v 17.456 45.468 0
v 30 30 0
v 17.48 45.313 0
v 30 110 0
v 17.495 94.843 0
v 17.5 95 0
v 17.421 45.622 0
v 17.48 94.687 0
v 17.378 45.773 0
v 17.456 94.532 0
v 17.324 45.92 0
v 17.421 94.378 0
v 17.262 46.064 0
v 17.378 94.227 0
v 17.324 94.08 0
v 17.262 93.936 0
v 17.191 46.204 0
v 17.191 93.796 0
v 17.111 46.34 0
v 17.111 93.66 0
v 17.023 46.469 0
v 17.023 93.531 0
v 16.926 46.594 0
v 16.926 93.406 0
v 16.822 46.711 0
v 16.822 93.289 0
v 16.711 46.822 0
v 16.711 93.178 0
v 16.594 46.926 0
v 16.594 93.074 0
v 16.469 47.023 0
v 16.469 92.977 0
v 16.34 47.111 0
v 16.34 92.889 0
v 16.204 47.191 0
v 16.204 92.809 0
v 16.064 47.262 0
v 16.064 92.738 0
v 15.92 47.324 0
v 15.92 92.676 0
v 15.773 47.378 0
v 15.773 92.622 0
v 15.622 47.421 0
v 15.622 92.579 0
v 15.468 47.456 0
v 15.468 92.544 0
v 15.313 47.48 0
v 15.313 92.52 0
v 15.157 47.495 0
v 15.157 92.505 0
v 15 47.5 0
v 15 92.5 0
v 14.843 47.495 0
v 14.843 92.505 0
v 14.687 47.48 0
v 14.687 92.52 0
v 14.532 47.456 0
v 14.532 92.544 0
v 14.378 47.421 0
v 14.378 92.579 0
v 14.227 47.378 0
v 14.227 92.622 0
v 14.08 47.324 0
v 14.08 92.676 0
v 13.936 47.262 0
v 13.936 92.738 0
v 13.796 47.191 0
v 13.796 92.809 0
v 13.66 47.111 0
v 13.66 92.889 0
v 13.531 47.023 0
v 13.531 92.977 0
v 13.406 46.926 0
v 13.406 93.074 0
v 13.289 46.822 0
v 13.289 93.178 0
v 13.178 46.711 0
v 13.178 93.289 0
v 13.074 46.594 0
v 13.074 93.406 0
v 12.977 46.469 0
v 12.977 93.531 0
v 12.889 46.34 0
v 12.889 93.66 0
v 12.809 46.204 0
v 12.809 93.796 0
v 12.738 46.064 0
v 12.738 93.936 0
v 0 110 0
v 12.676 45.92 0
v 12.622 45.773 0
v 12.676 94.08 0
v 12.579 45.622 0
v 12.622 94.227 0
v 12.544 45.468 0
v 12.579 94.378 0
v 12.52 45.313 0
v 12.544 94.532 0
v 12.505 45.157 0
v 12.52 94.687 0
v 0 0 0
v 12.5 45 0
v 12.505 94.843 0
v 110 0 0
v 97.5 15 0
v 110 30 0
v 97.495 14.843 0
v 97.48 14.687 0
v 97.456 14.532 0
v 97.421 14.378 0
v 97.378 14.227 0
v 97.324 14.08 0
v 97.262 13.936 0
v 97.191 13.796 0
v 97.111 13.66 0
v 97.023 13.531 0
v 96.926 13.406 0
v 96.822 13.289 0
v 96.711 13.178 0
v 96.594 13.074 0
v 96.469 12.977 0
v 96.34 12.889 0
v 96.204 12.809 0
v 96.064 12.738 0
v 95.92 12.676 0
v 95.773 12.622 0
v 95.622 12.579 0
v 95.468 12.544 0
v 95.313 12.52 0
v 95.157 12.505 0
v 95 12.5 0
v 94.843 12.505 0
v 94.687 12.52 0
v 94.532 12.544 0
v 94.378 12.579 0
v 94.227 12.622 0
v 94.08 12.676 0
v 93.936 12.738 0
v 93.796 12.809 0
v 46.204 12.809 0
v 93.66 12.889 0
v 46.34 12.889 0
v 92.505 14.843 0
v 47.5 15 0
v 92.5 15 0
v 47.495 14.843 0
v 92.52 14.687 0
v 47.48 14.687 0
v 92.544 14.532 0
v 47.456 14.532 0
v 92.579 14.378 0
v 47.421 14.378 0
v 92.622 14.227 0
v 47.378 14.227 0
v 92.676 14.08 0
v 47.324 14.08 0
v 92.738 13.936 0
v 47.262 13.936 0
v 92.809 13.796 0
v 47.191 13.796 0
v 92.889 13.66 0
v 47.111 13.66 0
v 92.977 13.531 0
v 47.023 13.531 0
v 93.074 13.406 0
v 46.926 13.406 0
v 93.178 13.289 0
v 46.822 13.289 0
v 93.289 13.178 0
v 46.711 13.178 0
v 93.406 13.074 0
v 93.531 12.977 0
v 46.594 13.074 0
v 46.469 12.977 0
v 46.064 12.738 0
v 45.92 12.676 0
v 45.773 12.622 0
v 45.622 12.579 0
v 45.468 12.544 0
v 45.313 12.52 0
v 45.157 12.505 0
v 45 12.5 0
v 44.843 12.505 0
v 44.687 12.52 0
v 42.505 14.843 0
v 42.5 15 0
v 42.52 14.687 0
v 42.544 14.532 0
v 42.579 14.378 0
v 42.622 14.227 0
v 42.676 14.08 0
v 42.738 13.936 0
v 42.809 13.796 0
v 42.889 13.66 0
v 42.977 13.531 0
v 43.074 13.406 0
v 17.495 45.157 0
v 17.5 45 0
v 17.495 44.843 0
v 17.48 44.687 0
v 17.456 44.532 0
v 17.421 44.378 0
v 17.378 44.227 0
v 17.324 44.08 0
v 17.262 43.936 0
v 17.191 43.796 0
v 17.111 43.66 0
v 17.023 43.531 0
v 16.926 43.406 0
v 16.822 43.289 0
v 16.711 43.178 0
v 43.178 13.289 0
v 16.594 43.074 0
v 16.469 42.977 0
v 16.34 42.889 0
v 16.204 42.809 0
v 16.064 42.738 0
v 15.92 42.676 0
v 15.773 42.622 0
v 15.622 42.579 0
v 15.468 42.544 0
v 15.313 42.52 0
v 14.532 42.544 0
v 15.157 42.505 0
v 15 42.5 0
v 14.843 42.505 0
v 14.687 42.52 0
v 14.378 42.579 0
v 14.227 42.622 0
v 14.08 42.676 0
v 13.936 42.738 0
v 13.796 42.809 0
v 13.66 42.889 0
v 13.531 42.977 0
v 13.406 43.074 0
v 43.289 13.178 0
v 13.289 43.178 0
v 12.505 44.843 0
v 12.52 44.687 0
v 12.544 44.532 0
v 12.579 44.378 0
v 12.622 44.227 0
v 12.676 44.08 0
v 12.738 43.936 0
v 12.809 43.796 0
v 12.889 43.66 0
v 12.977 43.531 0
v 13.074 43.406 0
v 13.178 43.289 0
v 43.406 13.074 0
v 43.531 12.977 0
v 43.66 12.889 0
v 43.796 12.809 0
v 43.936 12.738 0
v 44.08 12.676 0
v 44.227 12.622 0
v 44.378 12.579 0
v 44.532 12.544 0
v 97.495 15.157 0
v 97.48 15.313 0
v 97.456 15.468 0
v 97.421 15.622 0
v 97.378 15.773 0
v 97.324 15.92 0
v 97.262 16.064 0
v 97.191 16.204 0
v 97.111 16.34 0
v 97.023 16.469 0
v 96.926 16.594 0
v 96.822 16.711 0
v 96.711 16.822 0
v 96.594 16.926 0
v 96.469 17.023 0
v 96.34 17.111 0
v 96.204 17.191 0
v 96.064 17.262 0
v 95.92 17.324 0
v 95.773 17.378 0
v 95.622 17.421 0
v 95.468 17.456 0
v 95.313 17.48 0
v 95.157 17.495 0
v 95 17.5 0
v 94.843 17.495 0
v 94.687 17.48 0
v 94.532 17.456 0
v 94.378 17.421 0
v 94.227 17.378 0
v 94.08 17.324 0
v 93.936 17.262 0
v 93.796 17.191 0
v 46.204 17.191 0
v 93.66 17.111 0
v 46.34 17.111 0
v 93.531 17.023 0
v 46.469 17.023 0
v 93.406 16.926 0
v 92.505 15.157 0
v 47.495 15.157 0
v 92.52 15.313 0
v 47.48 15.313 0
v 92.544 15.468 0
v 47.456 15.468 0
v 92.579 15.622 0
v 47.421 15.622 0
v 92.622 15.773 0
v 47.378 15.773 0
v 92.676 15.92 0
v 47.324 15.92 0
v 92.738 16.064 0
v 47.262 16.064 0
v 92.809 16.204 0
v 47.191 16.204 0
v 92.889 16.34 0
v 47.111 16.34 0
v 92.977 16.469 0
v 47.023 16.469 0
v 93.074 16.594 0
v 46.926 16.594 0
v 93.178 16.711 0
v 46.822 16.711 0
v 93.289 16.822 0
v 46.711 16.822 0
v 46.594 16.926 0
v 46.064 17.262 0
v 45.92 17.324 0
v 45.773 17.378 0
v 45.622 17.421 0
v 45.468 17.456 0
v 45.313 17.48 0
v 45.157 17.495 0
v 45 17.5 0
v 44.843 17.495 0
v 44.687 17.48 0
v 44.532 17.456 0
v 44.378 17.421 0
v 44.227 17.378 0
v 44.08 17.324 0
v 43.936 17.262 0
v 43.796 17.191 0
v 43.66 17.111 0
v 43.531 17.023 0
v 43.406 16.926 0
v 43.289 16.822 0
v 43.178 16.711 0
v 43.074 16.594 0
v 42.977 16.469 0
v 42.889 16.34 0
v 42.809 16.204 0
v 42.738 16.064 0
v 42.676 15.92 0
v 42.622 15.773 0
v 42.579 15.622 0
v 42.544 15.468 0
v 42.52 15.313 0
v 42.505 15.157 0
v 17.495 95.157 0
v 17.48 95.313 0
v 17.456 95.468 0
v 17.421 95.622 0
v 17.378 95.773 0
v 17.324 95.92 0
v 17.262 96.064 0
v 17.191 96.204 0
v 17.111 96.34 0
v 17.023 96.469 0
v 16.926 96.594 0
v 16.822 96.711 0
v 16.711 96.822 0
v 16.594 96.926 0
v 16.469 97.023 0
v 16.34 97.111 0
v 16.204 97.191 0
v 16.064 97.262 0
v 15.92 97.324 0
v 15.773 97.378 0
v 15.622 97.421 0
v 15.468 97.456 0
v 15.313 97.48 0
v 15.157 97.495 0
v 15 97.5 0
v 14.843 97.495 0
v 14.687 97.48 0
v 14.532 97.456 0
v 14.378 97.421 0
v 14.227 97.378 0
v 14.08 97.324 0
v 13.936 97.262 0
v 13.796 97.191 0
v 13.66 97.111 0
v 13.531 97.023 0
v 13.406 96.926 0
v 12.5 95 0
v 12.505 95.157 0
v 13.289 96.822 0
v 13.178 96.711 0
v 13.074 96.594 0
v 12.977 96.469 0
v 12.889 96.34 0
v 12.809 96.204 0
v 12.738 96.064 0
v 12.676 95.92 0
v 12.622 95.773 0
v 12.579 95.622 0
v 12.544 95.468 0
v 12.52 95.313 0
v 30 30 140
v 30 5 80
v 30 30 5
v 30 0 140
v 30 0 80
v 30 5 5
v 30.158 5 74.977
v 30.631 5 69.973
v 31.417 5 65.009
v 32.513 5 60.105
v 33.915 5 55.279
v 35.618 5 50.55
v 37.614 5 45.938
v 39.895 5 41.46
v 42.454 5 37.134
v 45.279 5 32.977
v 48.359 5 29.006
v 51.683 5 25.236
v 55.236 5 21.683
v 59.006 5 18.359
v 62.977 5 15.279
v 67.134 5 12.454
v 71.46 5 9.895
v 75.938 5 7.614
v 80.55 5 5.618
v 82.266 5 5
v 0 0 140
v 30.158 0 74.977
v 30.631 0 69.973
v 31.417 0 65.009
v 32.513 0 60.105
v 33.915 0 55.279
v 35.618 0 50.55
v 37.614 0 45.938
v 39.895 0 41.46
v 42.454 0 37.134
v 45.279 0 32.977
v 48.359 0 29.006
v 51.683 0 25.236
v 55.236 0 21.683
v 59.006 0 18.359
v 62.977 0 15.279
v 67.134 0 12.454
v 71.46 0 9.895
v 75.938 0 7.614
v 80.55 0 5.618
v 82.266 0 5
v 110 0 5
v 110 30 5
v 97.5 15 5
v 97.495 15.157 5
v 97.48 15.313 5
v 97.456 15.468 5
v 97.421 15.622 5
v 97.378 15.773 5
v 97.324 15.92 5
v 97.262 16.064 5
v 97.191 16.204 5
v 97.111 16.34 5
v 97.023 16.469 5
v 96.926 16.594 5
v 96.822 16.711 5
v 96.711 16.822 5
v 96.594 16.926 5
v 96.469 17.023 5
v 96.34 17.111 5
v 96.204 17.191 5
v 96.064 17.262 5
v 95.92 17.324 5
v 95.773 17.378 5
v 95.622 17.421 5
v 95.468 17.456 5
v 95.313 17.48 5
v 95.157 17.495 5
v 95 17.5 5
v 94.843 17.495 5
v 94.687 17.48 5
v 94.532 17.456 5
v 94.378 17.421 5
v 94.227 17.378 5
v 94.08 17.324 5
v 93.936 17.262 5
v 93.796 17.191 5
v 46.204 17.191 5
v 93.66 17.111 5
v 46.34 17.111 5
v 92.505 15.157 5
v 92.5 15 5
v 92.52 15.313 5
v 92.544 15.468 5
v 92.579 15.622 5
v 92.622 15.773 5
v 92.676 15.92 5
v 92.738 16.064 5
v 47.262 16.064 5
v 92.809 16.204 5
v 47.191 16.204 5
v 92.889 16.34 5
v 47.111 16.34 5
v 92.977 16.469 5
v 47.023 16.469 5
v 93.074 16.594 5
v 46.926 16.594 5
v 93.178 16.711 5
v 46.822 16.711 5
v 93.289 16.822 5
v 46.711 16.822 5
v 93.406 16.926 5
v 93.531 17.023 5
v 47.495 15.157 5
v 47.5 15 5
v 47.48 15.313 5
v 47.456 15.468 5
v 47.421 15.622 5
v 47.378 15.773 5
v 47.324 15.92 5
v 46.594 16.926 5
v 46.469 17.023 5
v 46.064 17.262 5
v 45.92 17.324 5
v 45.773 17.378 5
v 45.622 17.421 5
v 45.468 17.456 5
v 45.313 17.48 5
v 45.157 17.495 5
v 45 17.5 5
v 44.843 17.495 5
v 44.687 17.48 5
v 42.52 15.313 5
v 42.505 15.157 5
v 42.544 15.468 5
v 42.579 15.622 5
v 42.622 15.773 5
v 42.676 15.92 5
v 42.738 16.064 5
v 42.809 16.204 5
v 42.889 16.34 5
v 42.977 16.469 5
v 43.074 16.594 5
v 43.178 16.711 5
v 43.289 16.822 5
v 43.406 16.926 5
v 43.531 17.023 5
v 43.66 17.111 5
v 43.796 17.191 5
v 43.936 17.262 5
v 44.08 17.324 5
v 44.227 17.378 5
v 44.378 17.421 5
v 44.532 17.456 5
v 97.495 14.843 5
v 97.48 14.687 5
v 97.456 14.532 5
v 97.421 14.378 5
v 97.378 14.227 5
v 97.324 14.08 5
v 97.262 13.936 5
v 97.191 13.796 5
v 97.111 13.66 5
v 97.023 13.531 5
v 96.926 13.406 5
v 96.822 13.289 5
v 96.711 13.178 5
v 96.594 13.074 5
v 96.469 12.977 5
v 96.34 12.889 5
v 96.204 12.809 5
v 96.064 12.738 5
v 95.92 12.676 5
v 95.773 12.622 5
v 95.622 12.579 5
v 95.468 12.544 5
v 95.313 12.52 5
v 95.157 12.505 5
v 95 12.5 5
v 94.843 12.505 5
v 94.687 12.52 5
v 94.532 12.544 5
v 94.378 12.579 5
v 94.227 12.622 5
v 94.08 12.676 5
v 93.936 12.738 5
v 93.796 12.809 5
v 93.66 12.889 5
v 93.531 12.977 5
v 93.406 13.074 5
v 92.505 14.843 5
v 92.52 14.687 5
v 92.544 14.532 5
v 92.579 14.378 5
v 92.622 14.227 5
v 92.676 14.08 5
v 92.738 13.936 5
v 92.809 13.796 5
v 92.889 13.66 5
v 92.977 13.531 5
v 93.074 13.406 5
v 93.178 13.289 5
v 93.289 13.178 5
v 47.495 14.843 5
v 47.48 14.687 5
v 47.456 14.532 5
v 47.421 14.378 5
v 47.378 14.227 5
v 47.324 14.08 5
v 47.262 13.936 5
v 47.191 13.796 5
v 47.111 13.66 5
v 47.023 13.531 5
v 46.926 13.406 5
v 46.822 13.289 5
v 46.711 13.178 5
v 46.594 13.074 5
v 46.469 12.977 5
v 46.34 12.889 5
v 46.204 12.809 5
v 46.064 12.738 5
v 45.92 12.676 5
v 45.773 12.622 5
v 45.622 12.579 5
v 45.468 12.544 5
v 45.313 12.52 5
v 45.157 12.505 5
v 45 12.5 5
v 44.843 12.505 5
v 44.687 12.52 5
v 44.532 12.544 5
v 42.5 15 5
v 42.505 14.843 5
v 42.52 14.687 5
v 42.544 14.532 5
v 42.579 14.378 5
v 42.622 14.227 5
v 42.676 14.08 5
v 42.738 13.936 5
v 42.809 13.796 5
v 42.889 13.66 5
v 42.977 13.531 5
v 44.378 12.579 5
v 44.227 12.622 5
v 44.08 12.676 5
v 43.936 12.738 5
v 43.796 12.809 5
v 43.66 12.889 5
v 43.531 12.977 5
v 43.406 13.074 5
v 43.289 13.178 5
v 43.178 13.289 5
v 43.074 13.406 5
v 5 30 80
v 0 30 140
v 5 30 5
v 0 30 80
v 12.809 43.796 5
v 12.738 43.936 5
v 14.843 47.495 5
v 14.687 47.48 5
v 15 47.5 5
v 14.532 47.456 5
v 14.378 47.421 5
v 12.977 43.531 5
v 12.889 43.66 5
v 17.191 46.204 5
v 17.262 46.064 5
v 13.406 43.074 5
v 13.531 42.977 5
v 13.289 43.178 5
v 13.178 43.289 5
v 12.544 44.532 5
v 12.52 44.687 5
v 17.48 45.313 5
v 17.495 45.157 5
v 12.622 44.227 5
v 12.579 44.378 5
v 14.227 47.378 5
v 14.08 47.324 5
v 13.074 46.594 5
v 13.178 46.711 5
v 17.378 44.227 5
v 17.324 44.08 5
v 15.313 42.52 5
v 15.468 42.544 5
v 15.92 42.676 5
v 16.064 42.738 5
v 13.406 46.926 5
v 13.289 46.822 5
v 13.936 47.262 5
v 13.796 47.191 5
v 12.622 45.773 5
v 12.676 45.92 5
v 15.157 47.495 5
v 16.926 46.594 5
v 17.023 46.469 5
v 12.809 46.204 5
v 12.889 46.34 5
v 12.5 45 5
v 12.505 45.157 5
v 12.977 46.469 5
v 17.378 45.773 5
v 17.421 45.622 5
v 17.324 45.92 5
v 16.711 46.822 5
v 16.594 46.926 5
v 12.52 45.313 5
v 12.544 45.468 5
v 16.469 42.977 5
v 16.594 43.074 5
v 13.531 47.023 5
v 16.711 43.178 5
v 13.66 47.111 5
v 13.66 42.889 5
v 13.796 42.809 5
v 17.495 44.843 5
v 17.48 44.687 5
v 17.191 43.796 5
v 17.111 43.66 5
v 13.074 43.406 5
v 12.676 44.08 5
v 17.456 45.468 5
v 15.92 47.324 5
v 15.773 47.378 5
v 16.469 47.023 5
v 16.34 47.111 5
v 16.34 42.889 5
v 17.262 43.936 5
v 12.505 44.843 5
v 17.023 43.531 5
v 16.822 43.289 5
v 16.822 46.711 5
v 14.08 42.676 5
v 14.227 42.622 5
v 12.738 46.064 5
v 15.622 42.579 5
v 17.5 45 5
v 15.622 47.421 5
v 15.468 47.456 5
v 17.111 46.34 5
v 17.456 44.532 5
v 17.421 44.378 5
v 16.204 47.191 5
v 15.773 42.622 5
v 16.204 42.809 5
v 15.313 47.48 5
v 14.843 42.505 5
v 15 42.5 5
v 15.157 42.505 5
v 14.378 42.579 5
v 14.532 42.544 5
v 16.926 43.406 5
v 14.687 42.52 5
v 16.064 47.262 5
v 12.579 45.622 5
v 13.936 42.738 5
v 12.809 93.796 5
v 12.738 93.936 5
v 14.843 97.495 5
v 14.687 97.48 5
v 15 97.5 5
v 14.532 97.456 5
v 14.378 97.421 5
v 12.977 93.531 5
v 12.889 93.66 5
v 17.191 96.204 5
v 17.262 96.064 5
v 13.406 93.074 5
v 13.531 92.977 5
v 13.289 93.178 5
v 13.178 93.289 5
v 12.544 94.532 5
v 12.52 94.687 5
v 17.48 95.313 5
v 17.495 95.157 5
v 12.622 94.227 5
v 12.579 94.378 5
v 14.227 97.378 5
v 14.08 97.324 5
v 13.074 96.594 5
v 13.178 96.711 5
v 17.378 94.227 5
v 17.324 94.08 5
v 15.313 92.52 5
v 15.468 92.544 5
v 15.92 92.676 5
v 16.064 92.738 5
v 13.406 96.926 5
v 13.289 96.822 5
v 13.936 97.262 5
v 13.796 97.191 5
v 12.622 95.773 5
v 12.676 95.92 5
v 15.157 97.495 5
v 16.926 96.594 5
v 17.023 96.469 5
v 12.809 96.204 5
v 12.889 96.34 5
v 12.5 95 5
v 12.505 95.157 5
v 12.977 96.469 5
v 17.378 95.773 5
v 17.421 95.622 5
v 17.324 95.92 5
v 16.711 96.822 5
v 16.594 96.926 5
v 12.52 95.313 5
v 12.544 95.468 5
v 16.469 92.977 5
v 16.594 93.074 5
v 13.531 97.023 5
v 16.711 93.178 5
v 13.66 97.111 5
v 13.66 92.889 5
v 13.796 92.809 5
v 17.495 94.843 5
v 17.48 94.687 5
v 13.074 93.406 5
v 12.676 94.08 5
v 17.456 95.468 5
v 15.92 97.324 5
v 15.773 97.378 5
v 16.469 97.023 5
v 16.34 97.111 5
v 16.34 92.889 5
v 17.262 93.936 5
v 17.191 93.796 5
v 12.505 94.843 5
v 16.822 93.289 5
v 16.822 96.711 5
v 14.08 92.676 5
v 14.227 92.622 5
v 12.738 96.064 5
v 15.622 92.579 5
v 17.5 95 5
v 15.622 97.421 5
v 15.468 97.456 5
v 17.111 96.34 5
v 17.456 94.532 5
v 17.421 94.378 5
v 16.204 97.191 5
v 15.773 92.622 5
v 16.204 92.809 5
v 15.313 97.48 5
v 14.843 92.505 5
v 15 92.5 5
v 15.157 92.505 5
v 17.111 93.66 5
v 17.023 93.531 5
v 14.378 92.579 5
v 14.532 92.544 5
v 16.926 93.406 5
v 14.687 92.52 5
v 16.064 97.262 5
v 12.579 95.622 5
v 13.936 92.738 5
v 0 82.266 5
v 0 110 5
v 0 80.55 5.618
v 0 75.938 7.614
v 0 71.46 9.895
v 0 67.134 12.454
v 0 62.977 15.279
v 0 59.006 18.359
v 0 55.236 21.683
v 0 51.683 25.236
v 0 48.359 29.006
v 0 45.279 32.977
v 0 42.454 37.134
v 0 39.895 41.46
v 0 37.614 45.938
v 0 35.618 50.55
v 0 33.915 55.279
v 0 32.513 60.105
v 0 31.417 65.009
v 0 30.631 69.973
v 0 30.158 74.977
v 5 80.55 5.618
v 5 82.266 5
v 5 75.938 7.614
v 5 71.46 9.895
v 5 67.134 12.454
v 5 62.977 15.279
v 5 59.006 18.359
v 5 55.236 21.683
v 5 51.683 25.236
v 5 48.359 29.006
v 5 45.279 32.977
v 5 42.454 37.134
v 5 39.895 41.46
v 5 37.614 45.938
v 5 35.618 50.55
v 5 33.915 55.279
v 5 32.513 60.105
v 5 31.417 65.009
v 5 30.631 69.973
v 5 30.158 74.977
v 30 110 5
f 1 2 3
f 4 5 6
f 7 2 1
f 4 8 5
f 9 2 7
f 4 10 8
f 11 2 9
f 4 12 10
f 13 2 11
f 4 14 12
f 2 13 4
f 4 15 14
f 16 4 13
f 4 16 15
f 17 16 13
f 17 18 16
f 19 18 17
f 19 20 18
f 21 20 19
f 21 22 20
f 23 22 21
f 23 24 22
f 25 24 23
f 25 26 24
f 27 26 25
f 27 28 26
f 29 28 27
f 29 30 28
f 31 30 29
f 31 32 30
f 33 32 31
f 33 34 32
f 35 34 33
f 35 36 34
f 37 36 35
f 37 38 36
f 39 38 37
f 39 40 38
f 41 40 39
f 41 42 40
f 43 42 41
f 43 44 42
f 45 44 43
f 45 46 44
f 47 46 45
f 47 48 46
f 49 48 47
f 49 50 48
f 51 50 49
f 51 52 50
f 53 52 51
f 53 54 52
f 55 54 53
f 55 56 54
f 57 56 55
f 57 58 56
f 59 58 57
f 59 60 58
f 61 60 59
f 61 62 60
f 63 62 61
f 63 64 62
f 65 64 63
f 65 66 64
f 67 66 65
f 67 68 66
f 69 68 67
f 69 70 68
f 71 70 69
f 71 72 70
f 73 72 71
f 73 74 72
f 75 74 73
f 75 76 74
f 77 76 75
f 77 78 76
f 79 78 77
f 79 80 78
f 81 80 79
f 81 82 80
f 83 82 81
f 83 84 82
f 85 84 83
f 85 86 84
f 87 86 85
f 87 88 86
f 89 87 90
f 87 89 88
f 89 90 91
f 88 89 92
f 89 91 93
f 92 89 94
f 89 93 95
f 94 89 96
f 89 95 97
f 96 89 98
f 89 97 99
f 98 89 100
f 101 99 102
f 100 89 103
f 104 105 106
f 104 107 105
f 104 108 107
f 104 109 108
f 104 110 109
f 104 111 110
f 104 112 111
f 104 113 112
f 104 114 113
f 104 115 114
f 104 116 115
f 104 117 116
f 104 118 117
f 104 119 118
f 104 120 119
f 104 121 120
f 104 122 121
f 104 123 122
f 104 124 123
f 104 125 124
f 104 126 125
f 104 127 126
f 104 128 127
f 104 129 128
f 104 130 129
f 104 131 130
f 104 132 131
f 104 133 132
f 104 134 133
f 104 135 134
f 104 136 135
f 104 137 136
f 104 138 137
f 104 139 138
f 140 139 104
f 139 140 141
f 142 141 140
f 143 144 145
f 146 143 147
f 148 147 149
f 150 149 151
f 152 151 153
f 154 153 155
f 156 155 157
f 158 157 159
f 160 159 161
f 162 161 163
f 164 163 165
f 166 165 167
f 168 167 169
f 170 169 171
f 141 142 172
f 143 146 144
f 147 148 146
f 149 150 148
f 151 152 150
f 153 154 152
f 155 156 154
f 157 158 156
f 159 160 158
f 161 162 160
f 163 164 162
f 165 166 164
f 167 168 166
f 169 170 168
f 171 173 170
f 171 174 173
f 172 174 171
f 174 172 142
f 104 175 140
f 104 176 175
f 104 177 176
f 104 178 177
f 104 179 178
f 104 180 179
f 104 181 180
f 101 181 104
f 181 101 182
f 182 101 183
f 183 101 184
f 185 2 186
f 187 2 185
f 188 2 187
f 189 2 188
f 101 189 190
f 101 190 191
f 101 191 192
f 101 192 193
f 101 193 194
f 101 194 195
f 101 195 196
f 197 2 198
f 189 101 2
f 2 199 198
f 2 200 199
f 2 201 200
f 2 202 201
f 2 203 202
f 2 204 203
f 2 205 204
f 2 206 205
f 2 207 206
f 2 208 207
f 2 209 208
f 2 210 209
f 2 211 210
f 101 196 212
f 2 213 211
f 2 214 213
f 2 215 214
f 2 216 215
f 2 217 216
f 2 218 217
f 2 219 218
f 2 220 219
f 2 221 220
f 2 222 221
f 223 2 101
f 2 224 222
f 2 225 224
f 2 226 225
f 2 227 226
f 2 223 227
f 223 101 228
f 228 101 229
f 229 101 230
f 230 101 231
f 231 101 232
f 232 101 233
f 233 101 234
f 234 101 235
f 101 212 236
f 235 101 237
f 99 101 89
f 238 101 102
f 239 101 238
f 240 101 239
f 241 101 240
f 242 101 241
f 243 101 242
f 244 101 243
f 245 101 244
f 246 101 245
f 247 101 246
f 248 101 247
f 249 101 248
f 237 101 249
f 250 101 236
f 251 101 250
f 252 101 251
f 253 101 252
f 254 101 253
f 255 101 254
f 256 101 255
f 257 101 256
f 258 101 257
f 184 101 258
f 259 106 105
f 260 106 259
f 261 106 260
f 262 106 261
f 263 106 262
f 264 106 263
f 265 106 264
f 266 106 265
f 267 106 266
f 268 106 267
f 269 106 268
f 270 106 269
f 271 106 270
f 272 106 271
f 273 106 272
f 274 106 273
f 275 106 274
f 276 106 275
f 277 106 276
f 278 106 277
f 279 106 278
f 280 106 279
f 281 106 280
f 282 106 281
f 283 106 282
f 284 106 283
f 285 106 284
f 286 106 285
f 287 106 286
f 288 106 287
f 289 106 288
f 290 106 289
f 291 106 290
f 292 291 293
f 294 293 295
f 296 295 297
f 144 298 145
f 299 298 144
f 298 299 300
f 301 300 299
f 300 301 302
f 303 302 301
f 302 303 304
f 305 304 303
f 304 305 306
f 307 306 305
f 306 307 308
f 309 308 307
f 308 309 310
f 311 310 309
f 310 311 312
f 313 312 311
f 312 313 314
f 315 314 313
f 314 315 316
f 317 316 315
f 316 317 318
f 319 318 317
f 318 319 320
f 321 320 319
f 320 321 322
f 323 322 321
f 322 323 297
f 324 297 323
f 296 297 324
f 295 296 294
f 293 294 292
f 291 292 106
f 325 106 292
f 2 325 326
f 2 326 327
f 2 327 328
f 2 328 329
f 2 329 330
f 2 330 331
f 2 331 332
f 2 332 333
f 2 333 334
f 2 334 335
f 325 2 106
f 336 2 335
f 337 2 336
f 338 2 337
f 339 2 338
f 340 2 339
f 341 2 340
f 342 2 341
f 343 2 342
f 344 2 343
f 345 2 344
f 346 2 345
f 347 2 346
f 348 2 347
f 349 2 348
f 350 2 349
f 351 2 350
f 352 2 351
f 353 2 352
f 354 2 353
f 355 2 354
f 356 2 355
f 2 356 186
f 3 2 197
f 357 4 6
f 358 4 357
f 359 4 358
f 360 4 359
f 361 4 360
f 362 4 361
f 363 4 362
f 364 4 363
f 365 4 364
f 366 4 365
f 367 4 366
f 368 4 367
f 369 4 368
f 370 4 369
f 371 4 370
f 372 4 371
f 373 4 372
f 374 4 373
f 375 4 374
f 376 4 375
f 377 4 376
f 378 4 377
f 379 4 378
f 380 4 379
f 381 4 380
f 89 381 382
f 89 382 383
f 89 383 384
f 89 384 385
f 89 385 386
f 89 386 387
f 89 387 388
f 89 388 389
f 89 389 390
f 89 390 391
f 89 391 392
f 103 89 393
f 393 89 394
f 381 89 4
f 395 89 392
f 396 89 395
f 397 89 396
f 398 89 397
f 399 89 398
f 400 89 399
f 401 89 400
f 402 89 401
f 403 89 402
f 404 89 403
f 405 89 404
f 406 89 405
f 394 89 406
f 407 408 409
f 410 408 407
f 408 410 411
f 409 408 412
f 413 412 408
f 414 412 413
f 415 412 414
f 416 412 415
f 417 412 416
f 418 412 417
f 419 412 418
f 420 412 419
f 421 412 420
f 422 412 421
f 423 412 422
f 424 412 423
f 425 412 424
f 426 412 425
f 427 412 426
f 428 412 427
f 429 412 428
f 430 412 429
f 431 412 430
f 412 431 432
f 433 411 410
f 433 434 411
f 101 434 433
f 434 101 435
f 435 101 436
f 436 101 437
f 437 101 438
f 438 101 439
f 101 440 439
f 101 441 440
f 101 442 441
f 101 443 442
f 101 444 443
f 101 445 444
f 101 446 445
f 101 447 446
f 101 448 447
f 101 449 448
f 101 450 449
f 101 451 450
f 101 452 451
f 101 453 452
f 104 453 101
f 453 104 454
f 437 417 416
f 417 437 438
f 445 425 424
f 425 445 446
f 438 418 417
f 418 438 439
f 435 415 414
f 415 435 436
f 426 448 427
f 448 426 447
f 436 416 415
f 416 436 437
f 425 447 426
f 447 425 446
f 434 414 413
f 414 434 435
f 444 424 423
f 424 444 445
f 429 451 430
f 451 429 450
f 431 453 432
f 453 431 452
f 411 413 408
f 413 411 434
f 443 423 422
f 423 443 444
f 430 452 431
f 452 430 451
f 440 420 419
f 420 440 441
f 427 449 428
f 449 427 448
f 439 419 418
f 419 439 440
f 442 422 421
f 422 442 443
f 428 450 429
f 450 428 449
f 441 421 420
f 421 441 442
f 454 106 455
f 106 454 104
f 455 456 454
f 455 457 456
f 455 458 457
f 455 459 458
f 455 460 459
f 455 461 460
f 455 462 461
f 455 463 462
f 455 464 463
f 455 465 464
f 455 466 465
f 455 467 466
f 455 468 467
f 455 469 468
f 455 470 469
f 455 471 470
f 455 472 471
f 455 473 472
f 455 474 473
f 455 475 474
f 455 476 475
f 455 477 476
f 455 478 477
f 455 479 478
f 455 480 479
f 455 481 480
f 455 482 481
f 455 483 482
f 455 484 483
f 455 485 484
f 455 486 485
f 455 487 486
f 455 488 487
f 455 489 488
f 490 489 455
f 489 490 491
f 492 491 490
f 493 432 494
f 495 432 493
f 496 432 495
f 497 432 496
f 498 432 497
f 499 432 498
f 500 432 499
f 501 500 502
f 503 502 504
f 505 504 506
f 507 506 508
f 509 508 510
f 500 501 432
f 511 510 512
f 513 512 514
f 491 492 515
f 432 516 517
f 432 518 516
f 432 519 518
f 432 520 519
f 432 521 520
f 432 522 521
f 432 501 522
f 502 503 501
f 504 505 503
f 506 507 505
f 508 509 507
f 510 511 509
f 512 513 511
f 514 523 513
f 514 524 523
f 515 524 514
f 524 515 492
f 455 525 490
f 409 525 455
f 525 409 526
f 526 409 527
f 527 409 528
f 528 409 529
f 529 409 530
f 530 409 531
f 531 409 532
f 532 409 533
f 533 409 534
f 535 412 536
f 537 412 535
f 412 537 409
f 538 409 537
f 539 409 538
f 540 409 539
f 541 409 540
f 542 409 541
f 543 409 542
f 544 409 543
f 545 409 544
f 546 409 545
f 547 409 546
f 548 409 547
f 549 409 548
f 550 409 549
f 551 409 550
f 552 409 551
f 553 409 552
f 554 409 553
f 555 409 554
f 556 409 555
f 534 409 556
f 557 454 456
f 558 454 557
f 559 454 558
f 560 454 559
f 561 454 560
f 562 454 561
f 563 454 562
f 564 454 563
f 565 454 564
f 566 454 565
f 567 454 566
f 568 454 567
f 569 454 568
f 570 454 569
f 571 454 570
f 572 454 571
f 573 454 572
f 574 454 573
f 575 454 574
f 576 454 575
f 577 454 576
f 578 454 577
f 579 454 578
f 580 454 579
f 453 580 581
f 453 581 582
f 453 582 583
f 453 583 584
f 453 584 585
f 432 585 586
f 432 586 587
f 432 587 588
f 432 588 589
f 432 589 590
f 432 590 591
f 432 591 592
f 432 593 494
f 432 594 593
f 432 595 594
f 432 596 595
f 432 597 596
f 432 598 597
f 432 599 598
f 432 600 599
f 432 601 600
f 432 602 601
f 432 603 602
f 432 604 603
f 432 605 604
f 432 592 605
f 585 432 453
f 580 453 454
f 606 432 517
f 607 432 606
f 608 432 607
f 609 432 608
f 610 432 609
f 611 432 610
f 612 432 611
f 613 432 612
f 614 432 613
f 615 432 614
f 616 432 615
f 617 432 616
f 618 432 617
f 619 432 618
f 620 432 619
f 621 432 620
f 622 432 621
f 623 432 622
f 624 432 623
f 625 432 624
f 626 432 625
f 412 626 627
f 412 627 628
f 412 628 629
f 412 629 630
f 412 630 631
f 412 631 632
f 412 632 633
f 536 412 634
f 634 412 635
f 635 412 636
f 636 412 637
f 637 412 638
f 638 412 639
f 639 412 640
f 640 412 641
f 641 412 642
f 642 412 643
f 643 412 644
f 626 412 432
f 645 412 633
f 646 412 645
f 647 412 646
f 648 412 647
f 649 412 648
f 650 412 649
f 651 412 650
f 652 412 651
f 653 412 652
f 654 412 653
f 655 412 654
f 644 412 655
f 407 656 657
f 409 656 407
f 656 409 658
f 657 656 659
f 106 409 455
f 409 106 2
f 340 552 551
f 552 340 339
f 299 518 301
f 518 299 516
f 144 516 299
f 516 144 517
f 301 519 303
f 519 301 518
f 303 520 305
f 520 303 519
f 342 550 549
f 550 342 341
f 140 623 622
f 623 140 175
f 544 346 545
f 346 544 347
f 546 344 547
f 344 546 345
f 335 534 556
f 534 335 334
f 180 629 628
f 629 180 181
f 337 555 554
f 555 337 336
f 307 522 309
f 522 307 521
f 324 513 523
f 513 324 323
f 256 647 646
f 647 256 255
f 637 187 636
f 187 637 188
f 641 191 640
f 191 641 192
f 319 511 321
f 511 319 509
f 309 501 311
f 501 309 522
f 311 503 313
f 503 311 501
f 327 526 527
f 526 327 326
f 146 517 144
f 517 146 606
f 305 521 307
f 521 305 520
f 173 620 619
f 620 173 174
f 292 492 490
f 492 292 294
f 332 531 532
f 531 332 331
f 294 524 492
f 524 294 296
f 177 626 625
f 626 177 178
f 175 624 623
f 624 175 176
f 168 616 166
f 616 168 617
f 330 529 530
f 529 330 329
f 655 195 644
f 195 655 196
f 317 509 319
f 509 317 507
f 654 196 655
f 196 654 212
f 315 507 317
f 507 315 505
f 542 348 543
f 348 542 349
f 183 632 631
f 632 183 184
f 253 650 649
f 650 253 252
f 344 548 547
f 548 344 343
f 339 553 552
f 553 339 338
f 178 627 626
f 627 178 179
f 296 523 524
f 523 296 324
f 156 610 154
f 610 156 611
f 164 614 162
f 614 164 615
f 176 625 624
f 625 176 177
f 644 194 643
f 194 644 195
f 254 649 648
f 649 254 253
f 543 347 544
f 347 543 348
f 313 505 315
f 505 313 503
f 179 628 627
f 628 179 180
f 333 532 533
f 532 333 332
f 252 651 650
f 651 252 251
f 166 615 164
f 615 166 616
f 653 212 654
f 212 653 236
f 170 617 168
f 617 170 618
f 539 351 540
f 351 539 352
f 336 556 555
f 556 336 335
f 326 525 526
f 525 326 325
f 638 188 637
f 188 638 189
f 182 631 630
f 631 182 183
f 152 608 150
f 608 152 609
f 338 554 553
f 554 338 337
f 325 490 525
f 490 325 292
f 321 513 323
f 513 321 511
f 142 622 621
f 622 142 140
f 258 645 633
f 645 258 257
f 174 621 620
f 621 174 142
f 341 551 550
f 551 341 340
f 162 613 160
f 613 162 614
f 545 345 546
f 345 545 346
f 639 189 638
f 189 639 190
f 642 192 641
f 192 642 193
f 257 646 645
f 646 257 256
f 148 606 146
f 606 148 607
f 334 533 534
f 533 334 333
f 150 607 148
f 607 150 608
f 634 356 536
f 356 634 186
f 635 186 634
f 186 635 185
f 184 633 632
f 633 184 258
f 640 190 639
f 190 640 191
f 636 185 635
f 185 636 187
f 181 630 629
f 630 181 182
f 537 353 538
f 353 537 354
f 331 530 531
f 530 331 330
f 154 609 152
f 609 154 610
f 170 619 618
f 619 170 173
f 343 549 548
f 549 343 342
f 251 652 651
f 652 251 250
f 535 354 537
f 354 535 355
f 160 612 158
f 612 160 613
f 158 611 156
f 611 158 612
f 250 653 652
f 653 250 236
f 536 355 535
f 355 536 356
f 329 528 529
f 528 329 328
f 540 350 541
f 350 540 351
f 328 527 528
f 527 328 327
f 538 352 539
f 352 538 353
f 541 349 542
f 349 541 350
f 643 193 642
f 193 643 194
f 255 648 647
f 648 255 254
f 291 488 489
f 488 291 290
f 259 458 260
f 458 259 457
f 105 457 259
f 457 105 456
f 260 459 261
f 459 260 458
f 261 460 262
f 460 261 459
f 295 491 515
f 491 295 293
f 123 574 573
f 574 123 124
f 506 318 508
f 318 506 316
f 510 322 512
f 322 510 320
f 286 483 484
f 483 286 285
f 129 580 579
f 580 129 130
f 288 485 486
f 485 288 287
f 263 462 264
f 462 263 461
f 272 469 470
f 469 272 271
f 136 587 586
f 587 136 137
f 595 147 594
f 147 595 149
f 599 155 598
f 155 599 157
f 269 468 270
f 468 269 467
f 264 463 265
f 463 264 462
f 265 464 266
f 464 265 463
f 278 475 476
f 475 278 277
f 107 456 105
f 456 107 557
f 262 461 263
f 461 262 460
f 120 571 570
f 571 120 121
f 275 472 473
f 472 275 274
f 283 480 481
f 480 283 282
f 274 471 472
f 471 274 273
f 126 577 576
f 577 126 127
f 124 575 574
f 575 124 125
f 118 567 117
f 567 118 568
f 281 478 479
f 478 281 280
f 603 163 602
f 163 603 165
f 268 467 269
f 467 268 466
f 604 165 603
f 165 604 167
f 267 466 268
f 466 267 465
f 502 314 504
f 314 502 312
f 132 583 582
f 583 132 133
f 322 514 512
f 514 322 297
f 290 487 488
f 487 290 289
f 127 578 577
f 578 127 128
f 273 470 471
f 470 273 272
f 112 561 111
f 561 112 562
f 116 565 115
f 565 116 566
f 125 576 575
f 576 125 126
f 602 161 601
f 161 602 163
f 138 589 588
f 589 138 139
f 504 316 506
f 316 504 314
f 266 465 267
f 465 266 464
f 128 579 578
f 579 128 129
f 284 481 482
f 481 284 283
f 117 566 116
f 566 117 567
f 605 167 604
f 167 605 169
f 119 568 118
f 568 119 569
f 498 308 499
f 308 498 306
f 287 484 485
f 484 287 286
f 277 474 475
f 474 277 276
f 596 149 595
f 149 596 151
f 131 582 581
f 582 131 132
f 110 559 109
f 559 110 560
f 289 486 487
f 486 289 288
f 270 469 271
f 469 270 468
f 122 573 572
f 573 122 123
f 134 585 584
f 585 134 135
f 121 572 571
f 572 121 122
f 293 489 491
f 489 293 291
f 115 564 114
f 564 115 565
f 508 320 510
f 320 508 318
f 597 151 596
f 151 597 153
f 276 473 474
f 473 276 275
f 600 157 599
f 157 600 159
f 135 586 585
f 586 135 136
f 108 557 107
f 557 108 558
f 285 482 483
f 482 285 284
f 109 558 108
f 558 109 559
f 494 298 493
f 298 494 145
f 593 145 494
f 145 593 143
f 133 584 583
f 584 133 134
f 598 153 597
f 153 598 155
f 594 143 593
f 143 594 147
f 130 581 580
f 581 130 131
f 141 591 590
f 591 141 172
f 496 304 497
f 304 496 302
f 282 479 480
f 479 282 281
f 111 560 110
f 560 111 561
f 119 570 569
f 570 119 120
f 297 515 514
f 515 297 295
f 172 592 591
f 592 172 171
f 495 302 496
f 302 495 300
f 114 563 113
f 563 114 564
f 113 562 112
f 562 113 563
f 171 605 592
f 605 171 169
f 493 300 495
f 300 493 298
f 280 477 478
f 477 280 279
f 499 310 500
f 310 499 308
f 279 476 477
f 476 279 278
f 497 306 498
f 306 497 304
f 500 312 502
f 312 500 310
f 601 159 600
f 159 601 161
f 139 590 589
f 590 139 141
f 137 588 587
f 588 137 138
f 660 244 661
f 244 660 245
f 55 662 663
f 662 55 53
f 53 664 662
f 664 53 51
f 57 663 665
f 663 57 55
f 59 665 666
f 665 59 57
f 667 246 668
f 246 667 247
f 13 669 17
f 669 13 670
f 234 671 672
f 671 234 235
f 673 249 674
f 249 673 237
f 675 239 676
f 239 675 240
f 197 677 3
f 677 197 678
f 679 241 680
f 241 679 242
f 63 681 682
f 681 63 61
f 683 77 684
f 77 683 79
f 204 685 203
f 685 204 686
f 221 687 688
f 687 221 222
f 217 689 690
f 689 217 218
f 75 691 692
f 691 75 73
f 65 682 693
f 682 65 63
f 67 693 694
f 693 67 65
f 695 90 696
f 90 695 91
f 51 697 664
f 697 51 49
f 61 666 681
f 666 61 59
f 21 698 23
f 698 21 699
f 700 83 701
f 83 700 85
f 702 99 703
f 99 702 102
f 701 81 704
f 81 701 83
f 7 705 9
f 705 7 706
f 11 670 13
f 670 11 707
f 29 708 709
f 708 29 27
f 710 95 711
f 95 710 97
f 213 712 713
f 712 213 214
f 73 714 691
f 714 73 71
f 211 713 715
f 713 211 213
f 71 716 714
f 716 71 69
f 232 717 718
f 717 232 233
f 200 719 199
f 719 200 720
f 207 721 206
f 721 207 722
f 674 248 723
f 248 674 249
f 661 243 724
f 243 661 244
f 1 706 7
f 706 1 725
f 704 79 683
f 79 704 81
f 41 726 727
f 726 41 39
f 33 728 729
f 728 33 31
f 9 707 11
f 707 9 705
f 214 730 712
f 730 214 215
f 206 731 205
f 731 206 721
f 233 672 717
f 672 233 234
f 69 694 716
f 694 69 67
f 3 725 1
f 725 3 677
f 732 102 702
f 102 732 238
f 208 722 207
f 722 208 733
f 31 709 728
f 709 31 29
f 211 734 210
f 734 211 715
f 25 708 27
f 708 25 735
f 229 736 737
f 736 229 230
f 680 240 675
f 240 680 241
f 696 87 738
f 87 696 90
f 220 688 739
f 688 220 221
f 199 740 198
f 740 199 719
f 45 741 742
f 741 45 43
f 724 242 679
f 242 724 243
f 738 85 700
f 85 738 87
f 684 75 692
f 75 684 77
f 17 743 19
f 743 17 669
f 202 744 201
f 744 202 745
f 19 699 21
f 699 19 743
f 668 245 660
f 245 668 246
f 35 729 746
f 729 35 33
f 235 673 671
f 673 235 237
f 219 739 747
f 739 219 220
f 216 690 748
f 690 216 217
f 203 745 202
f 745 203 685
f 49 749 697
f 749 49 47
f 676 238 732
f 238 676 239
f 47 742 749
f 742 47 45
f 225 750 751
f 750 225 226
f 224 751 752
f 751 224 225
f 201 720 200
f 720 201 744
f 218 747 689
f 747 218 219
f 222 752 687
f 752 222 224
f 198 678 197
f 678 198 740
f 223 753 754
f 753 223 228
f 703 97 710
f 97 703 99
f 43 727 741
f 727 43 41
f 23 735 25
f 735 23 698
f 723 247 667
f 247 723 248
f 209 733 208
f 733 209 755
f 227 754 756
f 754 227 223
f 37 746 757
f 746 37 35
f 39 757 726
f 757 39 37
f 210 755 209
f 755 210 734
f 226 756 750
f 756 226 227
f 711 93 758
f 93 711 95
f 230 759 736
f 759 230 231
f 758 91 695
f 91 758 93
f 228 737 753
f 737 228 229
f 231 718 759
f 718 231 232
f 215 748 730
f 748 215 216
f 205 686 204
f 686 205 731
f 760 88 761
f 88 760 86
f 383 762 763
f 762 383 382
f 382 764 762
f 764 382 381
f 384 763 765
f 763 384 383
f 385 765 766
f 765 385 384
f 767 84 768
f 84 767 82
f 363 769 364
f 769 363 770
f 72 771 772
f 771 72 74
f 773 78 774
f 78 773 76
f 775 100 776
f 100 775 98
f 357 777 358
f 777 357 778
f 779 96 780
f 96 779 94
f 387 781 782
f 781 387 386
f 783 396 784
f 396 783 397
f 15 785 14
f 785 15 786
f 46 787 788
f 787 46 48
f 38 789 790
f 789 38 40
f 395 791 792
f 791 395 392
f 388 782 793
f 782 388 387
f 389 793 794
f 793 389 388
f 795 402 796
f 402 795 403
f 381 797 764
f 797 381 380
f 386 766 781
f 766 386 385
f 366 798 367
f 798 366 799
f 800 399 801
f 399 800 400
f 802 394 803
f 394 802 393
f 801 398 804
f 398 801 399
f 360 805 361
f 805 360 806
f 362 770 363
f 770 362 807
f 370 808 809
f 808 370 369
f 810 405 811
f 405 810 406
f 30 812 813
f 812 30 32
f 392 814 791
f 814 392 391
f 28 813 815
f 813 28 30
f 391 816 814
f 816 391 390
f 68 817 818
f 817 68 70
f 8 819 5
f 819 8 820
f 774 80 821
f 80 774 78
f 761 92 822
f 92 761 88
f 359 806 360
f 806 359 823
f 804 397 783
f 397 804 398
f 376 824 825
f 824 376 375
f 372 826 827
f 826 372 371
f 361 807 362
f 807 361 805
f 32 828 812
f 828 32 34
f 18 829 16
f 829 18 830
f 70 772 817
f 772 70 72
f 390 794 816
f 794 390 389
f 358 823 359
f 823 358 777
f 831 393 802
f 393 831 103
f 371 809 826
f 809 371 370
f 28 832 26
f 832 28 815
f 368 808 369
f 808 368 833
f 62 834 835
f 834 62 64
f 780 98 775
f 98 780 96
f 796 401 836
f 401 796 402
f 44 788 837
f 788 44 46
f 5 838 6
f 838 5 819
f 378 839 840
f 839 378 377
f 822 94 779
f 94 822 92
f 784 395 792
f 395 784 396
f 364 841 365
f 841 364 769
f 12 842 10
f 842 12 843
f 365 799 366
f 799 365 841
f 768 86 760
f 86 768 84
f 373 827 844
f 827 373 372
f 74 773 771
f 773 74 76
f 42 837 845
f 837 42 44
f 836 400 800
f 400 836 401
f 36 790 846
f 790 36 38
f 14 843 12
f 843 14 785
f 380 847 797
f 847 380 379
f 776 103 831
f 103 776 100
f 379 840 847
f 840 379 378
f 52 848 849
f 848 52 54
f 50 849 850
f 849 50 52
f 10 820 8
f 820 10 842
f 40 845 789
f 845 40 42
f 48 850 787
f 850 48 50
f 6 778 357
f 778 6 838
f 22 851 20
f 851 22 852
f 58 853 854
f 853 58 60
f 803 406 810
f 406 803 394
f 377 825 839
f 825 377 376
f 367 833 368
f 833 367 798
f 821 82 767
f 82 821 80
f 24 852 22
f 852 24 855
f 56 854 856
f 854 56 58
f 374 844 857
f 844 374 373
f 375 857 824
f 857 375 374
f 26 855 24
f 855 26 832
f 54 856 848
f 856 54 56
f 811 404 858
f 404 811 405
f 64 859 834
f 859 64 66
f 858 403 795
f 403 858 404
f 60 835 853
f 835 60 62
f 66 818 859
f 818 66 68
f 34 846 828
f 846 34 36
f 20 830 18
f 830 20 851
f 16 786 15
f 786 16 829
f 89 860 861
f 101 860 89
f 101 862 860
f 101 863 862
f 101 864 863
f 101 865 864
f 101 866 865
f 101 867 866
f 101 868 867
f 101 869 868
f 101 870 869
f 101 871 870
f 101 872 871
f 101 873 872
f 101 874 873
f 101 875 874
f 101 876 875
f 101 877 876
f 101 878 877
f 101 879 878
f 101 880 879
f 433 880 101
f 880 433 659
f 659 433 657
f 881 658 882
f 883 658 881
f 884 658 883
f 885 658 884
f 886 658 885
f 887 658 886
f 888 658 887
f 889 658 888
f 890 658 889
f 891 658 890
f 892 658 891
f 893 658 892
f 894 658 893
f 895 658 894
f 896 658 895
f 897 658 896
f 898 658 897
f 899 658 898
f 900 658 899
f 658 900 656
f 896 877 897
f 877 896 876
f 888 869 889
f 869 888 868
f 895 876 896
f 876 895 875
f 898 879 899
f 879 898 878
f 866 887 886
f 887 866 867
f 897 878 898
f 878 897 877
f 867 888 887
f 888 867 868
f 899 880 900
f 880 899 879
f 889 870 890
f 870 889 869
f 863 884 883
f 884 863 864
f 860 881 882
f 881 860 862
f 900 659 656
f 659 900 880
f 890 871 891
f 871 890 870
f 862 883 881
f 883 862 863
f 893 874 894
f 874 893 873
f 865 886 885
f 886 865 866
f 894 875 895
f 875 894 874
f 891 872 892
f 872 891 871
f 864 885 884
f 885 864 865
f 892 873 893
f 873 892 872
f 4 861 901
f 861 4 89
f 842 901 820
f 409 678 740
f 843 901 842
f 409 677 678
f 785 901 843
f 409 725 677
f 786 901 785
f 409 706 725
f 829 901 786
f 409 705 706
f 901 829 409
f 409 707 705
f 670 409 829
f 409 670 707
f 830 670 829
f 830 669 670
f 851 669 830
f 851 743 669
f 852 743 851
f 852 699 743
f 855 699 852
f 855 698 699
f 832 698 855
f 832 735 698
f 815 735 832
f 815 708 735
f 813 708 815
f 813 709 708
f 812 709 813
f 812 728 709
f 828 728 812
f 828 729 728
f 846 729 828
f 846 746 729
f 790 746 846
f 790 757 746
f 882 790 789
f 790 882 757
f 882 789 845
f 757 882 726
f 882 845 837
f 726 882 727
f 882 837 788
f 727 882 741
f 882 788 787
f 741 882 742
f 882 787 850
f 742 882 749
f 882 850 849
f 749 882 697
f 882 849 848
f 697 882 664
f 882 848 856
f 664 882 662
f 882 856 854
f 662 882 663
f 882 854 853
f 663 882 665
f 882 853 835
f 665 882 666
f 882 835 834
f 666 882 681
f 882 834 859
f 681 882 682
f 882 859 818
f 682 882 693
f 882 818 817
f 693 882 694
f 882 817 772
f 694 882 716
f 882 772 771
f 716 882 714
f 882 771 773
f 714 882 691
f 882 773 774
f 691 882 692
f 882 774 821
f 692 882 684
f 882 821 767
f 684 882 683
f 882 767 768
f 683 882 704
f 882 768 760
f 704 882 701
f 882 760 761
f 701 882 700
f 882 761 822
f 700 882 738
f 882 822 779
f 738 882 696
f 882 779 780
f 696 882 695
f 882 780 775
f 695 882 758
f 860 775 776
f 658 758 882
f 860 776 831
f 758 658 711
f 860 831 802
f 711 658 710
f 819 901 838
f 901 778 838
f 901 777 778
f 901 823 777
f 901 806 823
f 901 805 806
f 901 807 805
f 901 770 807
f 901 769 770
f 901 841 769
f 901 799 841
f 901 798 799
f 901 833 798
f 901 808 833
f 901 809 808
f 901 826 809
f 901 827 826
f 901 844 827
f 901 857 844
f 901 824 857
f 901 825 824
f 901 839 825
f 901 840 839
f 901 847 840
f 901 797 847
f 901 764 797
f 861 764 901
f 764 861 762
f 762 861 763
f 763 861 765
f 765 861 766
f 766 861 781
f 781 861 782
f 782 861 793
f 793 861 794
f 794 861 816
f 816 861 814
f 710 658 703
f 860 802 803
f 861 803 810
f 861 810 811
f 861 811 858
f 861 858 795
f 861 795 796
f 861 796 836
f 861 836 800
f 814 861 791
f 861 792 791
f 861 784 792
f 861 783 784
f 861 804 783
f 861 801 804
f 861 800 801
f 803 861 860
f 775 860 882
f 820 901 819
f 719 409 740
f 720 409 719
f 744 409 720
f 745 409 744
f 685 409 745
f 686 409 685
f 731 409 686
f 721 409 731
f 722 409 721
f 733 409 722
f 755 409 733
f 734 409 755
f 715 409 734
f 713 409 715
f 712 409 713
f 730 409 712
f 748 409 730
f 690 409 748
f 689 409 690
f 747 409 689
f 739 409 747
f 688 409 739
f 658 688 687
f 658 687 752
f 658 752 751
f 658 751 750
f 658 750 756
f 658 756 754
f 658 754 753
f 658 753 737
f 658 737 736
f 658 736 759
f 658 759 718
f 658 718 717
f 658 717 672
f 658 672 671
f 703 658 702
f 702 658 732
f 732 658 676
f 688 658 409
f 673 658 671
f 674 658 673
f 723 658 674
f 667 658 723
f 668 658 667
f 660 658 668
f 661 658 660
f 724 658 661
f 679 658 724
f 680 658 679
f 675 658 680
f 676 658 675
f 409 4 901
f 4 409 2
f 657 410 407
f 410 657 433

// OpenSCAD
/* [Render] */
// Number of fragments, 0 means default
fn = 100; // 1
$fn = fn;

/* [Dimensions] */
// Total height of stand in mm
height = 140; // 0.1
// Length of bracket in mm
bracketLength = 80; // 0.1
// Width of stand in mm
standWidth = 30; // 0.1
// Thickness of bracket in mm
bracketThickness = 5; // 0.1
// Number of screw holes
screw_count = "two"; // [one:One, two:Two, none:None]
// Diameter of holes in mm
holeDiameter = 5; // 0.1

// Render:
// stand
cube([standWidth, standWidth, height]);
// bracket 1
translate([standWidth, 0, 0])
bracket1();
// bracket 2
rotate([0, 0, 90])
translate([standWidth, -standWidth, 0])
bracket2();

module bracket1() {
    difference() {
        union() {
            cube([bracketLength, standWidth, bracketThickness]);
        
            //brace
            difference() {
                cube([bracketLength, bracketThickness, bracketLength]);
                rotate([90, 0, 0])
                translate([bracketLength, bracketLength, -bracketThickness - 0.5])
                cylinder(h=bracketThickness + 1.0, r=bracketLength);
            }
        }
        if (screw_count == "one") {
            one_hole();
        } else if (screw_count == "two") {
            two_holes();
        } else if (screw_count == "none") {
            // No holes
        } else {
            echo("Error: Invalid screw count");
        }
    }
}

module bracket2() {
    difference() {
        union() {
            cube([bracketLength, standWidth, bracketThickness]);
        
            //brace
            difference() {
                translate([0, standWidth-bracketThickness, 0])
                cube([bracketLength, bracketThickness, bracketLength]);
                rotate([90, 0, 0])
                translate([bracketLength, bracketLength, - standWidth - 0.5])
                cylinder(h=bracketThickness + 1.0, r=bracketLength);
            }
        }
        if (screw_count == "one") {
            one_hole();
        } else if (screw_count == "two") {
            two_holes();
        } else if (screw_count == "none") {
            // No holes
        } else {
            echo("Error: Invalid screw count");
        }
    }
}

module one_hole() {
    translate([bracketLength - standWidth/2, standWidth/2, -0.5])
    cylinder(h=bracketThickness+1.0, d=holeDiameter);
}

module two_holes() {
    translate([standWidth/2, standWidth/2, -0.5])
    cylinder(h=bracketThickness+1.0, d=holeDiameter);
    translate([bracketLength - standWidth/2, standWidth/2, -0.5])
    cylinder(h=bracketThickness+1.0, d=holeDiameter);
}
